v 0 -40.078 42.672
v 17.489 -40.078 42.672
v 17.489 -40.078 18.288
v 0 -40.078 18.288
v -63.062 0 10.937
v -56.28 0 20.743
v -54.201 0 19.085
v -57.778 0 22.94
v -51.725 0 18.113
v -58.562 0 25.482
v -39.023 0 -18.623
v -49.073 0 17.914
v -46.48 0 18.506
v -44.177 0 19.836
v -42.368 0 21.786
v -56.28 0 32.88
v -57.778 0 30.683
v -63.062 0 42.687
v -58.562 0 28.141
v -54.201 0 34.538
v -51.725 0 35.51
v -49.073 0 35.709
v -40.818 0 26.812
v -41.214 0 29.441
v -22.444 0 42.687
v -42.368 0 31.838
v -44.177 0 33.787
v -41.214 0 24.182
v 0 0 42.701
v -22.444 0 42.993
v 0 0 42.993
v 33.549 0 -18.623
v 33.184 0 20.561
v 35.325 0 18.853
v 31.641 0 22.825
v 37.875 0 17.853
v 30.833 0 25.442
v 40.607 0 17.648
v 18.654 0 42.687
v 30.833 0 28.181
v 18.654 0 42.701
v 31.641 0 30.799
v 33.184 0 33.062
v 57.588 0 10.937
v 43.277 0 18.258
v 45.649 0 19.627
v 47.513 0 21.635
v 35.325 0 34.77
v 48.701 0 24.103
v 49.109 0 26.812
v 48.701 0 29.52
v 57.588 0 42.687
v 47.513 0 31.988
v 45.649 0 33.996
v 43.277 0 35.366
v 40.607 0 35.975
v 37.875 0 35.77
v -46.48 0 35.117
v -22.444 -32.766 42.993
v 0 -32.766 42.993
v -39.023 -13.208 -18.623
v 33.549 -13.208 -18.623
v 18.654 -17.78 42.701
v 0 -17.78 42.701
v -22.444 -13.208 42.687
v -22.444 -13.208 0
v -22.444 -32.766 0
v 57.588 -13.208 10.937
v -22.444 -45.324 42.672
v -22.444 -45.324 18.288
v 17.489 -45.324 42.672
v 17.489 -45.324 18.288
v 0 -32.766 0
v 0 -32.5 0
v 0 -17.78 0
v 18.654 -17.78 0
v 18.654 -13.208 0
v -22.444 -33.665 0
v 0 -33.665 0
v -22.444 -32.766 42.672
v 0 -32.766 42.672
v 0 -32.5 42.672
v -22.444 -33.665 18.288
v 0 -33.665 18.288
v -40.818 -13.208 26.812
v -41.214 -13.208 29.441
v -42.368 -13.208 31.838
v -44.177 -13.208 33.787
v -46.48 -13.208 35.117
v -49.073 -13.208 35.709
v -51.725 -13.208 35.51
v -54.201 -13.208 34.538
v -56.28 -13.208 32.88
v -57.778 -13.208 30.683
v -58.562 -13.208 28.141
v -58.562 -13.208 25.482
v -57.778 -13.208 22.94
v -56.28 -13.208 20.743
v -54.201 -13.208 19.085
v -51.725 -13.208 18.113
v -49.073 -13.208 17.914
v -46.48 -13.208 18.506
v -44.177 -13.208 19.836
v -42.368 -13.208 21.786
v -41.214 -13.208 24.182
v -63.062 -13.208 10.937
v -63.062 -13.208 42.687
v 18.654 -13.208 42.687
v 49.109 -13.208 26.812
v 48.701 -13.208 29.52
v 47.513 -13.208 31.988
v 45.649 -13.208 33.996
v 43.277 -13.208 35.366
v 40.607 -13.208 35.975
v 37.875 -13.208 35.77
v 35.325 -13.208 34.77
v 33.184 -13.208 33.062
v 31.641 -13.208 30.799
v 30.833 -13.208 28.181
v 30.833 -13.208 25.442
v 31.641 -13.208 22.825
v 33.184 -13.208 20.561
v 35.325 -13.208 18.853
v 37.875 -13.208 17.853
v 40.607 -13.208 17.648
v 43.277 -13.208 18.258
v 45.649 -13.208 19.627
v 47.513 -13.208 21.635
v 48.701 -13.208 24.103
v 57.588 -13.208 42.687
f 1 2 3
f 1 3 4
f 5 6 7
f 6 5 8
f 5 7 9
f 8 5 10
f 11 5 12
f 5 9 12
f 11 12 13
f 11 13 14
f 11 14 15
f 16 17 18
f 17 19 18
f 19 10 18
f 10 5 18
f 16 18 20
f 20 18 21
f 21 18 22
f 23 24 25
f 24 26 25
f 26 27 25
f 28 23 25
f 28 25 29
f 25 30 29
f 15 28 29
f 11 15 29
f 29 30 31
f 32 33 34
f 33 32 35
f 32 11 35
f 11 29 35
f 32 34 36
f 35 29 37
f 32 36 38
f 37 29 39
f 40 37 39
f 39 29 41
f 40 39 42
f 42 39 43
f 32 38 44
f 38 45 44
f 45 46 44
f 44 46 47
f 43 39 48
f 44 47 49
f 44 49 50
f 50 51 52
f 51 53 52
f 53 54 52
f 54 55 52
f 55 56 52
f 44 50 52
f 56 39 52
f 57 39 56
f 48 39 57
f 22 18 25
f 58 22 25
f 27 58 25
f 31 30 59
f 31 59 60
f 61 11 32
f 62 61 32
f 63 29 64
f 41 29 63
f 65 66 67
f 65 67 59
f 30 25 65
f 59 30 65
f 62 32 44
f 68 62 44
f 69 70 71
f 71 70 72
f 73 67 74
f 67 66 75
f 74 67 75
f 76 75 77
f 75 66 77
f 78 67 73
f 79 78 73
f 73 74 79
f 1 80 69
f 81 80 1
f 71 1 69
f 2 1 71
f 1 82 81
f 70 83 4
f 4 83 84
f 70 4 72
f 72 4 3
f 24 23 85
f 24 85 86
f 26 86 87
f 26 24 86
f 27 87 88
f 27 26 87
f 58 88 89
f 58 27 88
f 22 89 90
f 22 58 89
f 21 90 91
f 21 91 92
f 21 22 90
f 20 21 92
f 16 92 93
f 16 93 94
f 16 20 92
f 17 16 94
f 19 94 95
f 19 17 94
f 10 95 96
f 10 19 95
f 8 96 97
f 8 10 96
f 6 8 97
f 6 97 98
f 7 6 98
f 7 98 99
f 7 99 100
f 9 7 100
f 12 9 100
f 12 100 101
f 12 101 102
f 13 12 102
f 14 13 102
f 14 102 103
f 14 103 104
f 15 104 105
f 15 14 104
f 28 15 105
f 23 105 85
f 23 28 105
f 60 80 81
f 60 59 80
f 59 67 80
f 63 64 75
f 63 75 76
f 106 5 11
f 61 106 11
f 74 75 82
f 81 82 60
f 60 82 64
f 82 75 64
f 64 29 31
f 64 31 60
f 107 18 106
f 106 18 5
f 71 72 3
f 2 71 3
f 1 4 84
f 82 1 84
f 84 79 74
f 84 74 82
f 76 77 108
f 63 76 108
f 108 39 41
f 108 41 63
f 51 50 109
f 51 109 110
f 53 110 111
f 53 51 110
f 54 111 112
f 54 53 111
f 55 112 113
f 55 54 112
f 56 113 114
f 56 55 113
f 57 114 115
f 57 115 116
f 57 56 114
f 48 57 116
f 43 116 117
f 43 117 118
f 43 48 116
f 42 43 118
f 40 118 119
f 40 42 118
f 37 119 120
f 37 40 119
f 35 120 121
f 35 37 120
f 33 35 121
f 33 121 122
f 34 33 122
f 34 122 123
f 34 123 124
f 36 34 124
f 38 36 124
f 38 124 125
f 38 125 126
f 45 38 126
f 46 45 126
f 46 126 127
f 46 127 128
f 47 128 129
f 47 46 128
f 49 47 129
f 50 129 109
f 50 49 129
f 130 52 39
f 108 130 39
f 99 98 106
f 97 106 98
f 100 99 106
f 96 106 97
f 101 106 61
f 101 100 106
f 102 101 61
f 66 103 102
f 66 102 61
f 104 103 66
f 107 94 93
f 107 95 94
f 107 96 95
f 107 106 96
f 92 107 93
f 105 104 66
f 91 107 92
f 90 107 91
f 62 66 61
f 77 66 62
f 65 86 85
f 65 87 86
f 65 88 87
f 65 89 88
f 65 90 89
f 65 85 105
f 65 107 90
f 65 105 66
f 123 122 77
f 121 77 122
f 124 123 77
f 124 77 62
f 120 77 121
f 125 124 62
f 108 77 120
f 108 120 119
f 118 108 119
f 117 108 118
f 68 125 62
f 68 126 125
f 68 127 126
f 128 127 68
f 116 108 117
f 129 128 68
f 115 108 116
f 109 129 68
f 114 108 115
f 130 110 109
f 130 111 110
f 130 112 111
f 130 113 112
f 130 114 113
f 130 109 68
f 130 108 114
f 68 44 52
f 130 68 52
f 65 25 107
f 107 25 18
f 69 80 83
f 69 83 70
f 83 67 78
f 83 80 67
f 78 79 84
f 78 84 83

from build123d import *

# Parameters (mm, degrees)
F0_R     = 8.922134
F0_R_2   = 9.189262
F1_DEPTH = 13.208
F2_W     = 41.098034
F2_H     = 42.701147
F3_DEPTH = 17.78
F4_W     = 22.443607
F4_H     = 42.992625
F5_DEPTH = 32.766
F7_DEPTH = 42.672
F9_DEPTH = 18.288


with BuildPart() as f1:
    # F0 (on Front) → F1 (new body)
    with BuildSketch(Plane.XZ):
        Polygon((57.588355, 42.686574), (-63.061645, 42.686574), (-63.061645, 10.936574), (-39.022743, -18.62254), (33.549454, -18.62254), (57.588355, 10.936574), align=None)
        with Locations((-49.73989, 26.811574)):
            Circle(F0_R, mode=Mode.SUBTRACT)
        with Locations((39.919995, 26.811574)):
            Circle(F0_R_2, mode=Mode.SUBTRACT)
    extrude(amount=F1_DEPTH)

    # F2 (on Front) → F3 (join)
    with BuildSketch(Plane.XZ):
        with Locations((-1.89459, 21.350573)):
            Rectangle(F2_W, F2_H)
    extrude(amount=F3_DEPTH)

    # F4 (on Front) → F5 (join)
    with BuildSketch(Plane.XZ):
        with Locations((-11.221804, 21.496312)):
            Rectangle(F4_W, F4_H)
    extrude(amount=F5_DEPTH)

    # F6 (on Top) → F7 (join)
    with BuildSketch(Plane.XY):
        Polygon((0, -32.499507), (-22.443607, -32.499507), (-22.443607, -45.324426), (17.488524, -45.324426), (17.488524, -40.077869), (0, -40.077869), align=None)
    extrude(amount=F7_DEPTH)

    # F8 (on Top) → F9 (cut)
    with BuildSketch(Plane.XY):
        Polygon((0, -33.665407), (-22.443607, -33.665407), (-22.443607, -45.324426), (18.071475, -45.324426), (18.071475, -40.077869), (0, -40.077869), align=None)
    extrude(amount=F9_DEPTH, mode=Mode.SUBTRACT)


solid = f1.part
